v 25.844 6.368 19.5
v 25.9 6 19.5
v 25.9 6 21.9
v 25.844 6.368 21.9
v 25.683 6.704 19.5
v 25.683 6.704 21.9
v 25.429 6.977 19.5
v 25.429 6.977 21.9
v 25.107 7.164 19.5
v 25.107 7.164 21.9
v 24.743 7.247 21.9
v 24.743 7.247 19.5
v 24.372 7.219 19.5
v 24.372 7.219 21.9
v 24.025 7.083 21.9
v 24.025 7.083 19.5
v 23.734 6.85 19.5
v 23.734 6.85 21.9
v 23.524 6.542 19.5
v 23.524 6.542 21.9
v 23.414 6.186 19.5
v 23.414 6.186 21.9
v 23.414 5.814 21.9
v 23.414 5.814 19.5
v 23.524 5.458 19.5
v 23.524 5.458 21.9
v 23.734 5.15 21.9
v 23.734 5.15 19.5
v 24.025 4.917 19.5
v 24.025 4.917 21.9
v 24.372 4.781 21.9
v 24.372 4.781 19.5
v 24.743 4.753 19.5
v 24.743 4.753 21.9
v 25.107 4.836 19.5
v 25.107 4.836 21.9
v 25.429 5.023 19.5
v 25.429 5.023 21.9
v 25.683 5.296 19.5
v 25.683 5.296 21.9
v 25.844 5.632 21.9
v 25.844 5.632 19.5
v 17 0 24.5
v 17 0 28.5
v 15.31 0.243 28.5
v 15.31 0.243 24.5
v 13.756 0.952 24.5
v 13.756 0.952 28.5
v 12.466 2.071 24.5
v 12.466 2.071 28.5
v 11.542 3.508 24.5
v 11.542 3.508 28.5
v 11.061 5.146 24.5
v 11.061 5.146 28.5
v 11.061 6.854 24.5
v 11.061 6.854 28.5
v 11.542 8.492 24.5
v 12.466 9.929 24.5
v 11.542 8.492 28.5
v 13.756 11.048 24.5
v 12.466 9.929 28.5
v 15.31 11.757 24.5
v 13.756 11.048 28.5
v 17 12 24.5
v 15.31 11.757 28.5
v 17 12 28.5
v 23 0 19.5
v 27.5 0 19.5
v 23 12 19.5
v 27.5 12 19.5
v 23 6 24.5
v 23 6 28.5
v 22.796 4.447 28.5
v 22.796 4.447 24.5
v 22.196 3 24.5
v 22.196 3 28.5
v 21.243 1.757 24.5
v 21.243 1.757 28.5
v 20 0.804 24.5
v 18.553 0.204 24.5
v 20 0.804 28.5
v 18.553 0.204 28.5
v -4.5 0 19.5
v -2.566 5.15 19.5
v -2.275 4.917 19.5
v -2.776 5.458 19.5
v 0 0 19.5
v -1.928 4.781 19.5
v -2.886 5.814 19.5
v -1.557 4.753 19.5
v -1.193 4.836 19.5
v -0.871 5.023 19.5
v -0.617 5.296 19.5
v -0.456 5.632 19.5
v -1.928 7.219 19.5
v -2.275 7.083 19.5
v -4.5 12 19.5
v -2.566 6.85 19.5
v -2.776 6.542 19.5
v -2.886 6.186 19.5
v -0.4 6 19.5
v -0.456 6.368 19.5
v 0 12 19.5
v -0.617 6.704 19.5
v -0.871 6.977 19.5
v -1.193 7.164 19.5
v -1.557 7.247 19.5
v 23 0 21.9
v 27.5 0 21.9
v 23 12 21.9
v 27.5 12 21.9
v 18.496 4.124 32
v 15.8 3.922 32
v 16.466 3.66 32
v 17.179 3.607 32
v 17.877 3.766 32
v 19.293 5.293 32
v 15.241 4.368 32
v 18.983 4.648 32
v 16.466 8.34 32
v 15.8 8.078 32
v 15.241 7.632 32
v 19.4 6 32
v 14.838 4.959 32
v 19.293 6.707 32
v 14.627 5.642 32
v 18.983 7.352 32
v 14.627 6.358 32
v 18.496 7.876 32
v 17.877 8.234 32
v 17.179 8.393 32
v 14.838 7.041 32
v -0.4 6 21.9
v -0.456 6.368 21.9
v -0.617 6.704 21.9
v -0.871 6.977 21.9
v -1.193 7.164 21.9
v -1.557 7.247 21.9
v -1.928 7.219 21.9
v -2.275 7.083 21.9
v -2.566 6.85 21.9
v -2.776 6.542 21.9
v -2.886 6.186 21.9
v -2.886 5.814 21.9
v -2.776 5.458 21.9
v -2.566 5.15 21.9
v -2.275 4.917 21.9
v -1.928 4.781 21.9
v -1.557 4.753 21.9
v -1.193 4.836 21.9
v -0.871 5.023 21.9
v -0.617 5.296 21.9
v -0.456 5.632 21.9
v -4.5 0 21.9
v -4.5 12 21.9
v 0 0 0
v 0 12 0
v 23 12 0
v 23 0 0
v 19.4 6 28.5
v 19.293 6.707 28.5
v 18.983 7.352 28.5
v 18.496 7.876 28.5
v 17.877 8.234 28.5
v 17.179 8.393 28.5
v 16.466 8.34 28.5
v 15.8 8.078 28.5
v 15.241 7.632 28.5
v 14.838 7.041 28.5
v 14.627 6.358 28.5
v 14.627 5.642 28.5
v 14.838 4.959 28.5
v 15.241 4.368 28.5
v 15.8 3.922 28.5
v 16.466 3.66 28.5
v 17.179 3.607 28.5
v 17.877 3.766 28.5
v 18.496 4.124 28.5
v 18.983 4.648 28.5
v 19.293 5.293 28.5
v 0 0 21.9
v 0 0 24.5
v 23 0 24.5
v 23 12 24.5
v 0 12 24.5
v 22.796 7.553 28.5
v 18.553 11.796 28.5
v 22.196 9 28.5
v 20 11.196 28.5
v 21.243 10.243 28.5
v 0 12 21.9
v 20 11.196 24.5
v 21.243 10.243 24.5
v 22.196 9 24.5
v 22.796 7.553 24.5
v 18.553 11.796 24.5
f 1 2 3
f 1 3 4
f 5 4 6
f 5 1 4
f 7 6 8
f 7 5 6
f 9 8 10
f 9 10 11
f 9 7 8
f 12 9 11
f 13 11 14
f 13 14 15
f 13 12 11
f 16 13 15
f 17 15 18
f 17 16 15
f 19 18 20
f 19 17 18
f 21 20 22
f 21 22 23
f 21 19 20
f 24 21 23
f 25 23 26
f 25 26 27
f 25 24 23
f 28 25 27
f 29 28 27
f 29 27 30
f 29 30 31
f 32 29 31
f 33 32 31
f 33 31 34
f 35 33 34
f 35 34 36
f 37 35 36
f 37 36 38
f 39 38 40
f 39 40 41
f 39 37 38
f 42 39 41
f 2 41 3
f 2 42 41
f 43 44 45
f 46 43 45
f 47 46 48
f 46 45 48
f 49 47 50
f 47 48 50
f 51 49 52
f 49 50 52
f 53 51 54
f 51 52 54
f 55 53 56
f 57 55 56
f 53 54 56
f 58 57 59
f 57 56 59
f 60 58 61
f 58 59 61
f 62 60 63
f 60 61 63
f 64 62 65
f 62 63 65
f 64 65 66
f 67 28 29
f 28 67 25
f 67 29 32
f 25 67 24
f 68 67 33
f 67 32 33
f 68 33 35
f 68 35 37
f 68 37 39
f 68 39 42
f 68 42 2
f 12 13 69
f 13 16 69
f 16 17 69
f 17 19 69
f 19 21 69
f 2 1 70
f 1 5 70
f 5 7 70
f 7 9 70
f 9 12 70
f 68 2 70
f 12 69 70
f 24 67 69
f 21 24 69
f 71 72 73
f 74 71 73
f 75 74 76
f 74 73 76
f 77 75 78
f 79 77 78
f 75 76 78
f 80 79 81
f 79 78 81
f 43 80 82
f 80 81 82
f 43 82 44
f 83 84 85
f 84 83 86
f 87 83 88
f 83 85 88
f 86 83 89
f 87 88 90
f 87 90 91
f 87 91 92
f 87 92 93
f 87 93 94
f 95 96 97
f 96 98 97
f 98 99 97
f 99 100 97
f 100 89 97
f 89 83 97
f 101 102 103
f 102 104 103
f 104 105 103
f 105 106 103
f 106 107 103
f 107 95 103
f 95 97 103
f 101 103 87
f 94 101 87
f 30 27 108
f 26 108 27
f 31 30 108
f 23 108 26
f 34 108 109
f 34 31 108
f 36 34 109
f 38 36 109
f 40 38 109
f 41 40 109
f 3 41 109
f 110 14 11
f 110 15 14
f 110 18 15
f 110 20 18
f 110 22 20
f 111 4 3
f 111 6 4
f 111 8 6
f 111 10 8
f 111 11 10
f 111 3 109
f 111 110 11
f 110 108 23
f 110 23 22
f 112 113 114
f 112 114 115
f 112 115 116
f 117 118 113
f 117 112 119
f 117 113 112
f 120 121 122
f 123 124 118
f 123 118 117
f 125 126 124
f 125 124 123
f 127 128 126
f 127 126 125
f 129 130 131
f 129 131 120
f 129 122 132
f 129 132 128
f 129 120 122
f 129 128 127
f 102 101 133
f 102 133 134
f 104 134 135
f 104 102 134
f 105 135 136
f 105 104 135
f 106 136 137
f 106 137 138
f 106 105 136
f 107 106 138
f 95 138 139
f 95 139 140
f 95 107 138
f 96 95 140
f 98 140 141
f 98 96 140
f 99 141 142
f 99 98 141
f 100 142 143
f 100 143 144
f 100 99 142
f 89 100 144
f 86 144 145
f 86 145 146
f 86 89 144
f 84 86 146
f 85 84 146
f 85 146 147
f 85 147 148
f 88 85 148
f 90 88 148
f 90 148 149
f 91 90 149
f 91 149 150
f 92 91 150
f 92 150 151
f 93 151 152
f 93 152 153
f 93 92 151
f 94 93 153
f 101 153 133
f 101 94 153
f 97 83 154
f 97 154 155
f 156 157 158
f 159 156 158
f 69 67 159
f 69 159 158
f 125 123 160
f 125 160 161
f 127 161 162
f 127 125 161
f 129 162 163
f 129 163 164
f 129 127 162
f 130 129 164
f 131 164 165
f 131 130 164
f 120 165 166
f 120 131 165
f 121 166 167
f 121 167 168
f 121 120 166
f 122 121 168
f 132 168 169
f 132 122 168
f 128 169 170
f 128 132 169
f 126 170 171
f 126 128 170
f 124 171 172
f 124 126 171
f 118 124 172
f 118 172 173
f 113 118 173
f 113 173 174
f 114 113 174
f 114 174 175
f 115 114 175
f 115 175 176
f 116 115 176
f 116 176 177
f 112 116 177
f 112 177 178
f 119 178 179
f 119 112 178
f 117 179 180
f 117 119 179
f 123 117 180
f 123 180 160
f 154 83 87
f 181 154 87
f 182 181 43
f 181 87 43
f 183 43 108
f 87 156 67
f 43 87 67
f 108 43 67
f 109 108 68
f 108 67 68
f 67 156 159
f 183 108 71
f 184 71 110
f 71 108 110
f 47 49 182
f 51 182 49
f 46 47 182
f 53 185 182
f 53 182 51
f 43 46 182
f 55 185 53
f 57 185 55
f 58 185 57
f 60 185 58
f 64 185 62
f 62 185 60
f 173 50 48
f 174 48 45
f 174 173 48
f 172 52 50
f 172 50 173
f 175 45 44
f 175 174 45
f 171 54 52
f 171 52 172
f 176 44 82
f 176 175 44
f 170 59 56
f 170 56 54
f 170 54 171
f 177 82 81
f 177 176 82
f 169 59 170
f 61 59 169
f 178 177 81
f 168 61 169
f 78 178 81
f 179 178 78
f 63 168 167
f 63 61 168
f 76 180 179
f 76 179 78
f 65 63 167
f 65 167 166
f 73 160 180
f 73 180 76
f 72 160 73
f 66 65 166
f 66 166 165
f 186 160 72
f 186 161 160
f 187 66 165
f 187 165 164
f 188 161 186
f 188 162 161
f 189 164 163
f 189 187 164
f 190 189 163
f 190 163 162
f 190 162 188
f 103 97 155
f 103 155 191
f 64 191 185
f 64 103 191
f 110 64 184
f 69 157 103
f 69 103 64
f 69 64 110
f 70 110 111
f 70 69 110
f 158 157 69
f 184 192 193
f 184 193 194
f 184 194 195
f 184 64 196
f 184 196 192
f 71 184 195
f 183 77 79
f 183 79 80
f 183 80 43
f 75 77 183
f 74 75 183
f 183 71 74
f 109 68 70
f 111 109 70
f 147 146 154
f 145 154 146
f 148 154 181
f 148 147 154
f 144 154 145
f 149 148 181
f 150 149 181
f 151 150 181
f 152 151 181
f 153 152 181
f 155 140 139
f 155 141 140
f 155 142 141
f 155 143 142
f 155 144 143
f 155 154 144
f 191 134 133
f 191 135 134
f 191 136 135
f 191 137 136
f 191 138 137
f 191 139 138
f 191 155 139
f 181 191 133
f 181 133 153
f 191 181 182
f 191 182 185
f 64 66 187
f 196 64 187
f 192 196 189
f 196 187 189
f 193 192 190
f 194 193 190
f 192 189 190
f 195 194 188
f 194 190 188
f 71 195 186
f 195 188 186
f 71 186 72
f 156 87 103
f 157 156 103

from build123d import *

# Parameters (mm, degrees)
SKETCH1_W           = 23
SKETCH1_H           = 12
BOSS_EXTRUDE1_DEPTH = 32
CUT_EXTRUDE1_DEPTH  = 7.5
SKETCH3_R           = 6
SKETCH3_R_2         = 2.4
CUT_EXTRUDE2_DEPTH  = 3.5
SKETCH4_W           = 32
SKETCH4_H           = 12
SKETCH4_R           = 1.25
BOSS_EXTRUDE2_DEPTH = 2.4


with BuildPart() as part:
    # Sketch1 → Boss-Extrude1 (new body)
    with BuildSketch(Plane.XY):
        with Locations((11.5, 6)):
            Rectangle(SKETCH1_W, SKETCH1_H)
    extrude(amount=BOSS_EXTRUDE1_DEPTH)

    # Sketch2 → Cut-Extrude1 (cut)
    with BuildSketch(Plane.XY.offset(32)):
        with BuildLine():
            Line((17, 12), (0, 12))
            Line((0, 12), (0, 0))
            Line((0, 0), (17, 0))
            ThreePointArc((17, 0), (11, 6), (17, 12))
        make_face()
        with BuildLine():
            Line((23, 12), (17, 12))
            ThreePointArc((17, 12), (21.242640687, 10.242640687), (23, 6))
            Line((23, 6), (23, 12))
        make_face()
        with BuildLine():
            ThreePointArc((23, 6), (21.242640687, 1.757359313), (17, 0))
            Line((17, 0), (23, 0))
            Line((23, 0), (23, 6))
        make_face()
    extrude(amount=-CUT_EXTRUDE1_DEPTH, mode=Mode.SUBTRACT)

    # Sketch3 → Cut-Extrude2 (cut)
    with BuildSketch(Plane.XY.offset(32)):
        with Locations((17, 6)):
            Circle(SKETCH3_R)
        with Locations((17, 6)):
            Circle(SKETCH3_R_2, mode=Mode.SUBTRACT)
    extrude(amount=-CUT_EXTRUDE2_DEPTH, mode=Mode.SUBTRACT)

    # Sketch4 → Boss-Extrude2 (add)
    with BuildSketch(Plane.XY.offset(19.5)):
        with Locations((11.5, 6)):
            Rectangle(SKETCH4_W, SKETCH4_H)
        with Locations((24.65, 6)):
            Circle(SKETCH4_R, mode=Mode.SUBTRACT)
        with Locations((-1.65, 6)):
            Circle(SKETCH4_R, mode=Mode.SUBTRACT)
    extrude(amount=BOSS_EXTRUDE2_DEPTH)


solid = part.part
